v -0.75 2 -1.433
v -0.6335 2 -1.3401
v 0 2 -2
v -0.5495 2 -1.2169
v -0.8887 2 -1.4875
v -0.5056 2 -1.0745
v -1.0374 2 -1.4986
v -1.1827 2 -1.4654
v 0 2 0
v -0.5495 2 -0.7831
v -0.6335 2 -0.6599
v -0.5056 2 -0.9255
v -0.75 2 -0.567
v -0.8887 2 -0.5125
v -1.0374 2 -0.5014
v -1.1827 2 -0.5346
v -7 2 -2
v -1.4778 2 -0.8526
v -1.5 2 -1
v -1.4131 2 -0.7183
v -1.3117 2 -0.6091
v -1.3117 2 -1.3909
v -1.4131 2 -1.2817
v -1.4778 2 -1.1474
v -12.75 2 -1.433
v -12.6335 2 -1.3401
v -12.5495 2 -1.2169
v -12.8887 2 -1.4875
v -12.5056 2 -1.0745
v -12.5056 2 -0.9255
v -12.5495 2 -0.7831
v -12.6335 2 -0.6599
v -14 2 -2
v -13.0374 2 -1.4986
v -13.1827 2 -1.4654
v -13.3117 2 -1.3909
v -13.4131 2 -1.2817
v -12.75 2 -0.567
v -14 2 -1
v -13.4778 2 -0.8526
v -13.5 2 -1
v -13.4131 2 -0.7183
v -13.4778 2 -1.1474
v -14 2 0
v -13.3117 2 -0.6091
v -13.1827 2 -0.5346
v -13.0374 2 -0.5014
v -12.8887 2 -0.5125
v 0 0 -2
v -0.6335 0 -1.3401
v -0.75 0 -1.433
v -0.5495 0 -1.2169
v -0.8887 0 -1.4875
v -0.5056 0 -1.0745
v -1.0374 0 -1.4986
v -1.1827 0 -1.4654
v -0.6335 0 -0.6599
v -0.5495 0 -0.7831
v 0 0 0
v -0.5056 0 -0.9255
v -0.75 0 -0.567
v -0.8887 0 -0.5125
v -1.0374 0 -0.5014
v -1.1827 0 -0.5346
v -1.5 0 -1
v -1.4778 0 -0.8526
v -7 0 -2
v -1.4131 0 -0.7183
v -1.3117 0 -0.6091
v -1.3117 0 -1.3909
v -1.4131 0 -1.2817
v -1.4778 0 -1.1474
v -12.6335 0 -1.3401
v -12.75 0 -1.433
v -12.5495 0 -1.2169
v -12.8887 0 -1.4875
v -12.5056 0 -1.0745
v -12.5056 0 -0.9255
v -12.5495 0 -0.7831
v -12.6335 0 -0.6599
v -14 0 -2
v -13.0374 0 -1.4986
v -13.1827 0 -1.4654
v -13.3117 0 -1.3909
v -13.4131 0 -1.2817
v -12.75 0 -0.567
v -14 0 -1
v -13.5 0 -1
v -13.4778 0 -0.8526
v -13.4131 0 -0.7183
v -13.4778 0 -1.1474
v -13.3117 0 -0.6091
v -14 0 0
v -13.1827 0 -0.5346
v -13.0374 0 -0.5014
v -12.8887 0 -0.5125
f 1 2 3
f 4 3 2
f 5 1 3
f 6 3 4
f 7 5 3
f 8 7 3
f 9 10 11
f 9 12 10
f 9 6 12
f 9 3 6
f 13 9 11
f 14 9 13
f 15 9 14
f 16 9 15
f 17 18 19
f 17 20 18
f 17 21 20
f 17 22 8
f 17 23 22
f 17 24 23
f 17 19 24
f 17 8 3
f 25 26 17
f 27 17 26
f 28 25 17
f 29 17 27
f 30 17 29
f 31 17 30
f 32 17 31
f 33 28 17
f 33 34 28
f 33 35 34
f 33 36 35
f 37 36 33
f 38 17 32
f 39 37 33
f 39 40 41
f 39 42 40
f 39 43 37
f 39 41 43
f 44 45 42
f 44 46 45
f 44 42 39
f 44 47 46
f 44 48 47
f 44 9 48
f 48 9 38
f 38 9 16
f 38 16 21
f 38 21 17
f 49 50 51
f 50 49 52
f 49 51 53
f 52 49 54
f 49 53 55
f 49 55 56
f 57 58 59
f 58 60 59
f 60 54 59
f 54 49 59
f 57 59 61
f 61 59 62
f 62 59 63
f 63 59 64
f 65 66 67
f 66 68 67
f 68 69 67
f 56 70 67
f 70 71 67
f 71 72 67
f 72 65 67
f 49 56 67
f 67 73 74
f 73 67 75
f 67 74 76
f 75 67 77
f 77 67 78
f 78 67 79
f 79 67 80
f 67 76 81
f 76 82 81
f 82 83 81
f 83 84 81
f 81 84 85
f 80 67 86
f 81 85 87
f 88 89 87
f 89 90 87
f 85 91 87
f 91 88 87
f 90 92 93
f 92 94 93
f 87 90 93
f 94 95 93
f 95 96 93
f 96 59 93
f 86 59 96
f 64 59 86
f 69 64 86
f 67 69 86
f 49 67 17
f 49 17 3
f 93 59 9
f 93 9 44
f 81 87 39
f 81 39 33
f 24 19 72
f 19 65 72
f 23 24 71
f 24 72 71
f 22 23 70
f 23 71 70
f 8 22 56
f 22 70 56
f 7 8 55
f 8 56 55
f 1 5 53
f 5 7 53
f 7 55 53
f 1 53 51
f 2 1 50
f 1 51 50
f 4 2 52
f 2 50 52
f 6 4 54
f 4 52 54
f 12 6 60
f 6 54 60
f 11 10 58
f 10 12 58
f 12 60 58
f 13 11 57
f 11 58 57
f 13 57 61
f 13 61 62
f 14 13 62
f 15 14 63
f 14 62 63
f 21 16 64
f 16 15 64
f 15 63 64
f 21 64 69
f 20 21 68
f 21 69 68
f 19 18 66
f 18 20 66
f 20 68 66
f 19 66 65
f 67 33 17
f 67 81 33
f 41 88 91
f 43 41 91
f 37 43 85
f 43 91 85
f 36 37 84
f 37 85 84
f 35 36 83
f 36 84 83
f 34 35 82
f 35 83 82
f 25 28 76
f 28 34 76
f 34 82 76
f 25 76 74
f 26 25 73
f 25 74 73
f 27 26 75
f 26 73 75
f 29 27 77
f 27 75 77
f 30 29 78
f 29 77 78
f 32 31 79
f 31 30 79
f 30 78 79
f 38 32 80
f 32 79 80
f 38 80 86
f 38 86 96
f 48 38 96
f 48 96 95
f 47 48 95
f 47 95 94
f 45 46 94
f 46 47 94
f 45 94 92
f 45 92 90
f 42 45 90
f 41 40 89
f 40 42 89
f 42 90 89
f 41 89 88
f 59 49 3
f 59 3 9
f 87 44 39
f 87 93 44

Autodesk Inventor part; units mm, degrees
ref_plane "YZ Plane" through (0, 0, 0) normal (1, 0, 0) x (0, 1, 0)
ref_plane "XZ Plane" through (0, 0, 0) normal (0, 1, 0) x (-1, 0, 0)
ref_plane "XY Plane" through (0, 0, 0) normal (0, 0, 1) x (1, 0, 0)
sketch "Sketch1" plane through (0, 0, 0) normal (0, 1, 0) x (-1, 0, 0)
  line L0 (0, 0) -> (14, 0)
  line L1 (14, 0) -> (14, -2)
  line L2 (14, -2) -> (0, -2)
  line L3 (0, -2) -> (0, 0)
  line L4 (14, -1) -> (13, -1)
  line L5 (7, -2) -> (7, -1)
  circle A0 centre (13, -1) radius 0.5
  circle A1 centre (1, -1) radius 0.5
  dimension "d0" = 14
  dimension "d1" = 2
  dimension "d2" = 1
  dimension "d3" = 1
extrude "Extrusion1" add sketch "Sketch1" along normal blind 2
properties part number "link_v3"
